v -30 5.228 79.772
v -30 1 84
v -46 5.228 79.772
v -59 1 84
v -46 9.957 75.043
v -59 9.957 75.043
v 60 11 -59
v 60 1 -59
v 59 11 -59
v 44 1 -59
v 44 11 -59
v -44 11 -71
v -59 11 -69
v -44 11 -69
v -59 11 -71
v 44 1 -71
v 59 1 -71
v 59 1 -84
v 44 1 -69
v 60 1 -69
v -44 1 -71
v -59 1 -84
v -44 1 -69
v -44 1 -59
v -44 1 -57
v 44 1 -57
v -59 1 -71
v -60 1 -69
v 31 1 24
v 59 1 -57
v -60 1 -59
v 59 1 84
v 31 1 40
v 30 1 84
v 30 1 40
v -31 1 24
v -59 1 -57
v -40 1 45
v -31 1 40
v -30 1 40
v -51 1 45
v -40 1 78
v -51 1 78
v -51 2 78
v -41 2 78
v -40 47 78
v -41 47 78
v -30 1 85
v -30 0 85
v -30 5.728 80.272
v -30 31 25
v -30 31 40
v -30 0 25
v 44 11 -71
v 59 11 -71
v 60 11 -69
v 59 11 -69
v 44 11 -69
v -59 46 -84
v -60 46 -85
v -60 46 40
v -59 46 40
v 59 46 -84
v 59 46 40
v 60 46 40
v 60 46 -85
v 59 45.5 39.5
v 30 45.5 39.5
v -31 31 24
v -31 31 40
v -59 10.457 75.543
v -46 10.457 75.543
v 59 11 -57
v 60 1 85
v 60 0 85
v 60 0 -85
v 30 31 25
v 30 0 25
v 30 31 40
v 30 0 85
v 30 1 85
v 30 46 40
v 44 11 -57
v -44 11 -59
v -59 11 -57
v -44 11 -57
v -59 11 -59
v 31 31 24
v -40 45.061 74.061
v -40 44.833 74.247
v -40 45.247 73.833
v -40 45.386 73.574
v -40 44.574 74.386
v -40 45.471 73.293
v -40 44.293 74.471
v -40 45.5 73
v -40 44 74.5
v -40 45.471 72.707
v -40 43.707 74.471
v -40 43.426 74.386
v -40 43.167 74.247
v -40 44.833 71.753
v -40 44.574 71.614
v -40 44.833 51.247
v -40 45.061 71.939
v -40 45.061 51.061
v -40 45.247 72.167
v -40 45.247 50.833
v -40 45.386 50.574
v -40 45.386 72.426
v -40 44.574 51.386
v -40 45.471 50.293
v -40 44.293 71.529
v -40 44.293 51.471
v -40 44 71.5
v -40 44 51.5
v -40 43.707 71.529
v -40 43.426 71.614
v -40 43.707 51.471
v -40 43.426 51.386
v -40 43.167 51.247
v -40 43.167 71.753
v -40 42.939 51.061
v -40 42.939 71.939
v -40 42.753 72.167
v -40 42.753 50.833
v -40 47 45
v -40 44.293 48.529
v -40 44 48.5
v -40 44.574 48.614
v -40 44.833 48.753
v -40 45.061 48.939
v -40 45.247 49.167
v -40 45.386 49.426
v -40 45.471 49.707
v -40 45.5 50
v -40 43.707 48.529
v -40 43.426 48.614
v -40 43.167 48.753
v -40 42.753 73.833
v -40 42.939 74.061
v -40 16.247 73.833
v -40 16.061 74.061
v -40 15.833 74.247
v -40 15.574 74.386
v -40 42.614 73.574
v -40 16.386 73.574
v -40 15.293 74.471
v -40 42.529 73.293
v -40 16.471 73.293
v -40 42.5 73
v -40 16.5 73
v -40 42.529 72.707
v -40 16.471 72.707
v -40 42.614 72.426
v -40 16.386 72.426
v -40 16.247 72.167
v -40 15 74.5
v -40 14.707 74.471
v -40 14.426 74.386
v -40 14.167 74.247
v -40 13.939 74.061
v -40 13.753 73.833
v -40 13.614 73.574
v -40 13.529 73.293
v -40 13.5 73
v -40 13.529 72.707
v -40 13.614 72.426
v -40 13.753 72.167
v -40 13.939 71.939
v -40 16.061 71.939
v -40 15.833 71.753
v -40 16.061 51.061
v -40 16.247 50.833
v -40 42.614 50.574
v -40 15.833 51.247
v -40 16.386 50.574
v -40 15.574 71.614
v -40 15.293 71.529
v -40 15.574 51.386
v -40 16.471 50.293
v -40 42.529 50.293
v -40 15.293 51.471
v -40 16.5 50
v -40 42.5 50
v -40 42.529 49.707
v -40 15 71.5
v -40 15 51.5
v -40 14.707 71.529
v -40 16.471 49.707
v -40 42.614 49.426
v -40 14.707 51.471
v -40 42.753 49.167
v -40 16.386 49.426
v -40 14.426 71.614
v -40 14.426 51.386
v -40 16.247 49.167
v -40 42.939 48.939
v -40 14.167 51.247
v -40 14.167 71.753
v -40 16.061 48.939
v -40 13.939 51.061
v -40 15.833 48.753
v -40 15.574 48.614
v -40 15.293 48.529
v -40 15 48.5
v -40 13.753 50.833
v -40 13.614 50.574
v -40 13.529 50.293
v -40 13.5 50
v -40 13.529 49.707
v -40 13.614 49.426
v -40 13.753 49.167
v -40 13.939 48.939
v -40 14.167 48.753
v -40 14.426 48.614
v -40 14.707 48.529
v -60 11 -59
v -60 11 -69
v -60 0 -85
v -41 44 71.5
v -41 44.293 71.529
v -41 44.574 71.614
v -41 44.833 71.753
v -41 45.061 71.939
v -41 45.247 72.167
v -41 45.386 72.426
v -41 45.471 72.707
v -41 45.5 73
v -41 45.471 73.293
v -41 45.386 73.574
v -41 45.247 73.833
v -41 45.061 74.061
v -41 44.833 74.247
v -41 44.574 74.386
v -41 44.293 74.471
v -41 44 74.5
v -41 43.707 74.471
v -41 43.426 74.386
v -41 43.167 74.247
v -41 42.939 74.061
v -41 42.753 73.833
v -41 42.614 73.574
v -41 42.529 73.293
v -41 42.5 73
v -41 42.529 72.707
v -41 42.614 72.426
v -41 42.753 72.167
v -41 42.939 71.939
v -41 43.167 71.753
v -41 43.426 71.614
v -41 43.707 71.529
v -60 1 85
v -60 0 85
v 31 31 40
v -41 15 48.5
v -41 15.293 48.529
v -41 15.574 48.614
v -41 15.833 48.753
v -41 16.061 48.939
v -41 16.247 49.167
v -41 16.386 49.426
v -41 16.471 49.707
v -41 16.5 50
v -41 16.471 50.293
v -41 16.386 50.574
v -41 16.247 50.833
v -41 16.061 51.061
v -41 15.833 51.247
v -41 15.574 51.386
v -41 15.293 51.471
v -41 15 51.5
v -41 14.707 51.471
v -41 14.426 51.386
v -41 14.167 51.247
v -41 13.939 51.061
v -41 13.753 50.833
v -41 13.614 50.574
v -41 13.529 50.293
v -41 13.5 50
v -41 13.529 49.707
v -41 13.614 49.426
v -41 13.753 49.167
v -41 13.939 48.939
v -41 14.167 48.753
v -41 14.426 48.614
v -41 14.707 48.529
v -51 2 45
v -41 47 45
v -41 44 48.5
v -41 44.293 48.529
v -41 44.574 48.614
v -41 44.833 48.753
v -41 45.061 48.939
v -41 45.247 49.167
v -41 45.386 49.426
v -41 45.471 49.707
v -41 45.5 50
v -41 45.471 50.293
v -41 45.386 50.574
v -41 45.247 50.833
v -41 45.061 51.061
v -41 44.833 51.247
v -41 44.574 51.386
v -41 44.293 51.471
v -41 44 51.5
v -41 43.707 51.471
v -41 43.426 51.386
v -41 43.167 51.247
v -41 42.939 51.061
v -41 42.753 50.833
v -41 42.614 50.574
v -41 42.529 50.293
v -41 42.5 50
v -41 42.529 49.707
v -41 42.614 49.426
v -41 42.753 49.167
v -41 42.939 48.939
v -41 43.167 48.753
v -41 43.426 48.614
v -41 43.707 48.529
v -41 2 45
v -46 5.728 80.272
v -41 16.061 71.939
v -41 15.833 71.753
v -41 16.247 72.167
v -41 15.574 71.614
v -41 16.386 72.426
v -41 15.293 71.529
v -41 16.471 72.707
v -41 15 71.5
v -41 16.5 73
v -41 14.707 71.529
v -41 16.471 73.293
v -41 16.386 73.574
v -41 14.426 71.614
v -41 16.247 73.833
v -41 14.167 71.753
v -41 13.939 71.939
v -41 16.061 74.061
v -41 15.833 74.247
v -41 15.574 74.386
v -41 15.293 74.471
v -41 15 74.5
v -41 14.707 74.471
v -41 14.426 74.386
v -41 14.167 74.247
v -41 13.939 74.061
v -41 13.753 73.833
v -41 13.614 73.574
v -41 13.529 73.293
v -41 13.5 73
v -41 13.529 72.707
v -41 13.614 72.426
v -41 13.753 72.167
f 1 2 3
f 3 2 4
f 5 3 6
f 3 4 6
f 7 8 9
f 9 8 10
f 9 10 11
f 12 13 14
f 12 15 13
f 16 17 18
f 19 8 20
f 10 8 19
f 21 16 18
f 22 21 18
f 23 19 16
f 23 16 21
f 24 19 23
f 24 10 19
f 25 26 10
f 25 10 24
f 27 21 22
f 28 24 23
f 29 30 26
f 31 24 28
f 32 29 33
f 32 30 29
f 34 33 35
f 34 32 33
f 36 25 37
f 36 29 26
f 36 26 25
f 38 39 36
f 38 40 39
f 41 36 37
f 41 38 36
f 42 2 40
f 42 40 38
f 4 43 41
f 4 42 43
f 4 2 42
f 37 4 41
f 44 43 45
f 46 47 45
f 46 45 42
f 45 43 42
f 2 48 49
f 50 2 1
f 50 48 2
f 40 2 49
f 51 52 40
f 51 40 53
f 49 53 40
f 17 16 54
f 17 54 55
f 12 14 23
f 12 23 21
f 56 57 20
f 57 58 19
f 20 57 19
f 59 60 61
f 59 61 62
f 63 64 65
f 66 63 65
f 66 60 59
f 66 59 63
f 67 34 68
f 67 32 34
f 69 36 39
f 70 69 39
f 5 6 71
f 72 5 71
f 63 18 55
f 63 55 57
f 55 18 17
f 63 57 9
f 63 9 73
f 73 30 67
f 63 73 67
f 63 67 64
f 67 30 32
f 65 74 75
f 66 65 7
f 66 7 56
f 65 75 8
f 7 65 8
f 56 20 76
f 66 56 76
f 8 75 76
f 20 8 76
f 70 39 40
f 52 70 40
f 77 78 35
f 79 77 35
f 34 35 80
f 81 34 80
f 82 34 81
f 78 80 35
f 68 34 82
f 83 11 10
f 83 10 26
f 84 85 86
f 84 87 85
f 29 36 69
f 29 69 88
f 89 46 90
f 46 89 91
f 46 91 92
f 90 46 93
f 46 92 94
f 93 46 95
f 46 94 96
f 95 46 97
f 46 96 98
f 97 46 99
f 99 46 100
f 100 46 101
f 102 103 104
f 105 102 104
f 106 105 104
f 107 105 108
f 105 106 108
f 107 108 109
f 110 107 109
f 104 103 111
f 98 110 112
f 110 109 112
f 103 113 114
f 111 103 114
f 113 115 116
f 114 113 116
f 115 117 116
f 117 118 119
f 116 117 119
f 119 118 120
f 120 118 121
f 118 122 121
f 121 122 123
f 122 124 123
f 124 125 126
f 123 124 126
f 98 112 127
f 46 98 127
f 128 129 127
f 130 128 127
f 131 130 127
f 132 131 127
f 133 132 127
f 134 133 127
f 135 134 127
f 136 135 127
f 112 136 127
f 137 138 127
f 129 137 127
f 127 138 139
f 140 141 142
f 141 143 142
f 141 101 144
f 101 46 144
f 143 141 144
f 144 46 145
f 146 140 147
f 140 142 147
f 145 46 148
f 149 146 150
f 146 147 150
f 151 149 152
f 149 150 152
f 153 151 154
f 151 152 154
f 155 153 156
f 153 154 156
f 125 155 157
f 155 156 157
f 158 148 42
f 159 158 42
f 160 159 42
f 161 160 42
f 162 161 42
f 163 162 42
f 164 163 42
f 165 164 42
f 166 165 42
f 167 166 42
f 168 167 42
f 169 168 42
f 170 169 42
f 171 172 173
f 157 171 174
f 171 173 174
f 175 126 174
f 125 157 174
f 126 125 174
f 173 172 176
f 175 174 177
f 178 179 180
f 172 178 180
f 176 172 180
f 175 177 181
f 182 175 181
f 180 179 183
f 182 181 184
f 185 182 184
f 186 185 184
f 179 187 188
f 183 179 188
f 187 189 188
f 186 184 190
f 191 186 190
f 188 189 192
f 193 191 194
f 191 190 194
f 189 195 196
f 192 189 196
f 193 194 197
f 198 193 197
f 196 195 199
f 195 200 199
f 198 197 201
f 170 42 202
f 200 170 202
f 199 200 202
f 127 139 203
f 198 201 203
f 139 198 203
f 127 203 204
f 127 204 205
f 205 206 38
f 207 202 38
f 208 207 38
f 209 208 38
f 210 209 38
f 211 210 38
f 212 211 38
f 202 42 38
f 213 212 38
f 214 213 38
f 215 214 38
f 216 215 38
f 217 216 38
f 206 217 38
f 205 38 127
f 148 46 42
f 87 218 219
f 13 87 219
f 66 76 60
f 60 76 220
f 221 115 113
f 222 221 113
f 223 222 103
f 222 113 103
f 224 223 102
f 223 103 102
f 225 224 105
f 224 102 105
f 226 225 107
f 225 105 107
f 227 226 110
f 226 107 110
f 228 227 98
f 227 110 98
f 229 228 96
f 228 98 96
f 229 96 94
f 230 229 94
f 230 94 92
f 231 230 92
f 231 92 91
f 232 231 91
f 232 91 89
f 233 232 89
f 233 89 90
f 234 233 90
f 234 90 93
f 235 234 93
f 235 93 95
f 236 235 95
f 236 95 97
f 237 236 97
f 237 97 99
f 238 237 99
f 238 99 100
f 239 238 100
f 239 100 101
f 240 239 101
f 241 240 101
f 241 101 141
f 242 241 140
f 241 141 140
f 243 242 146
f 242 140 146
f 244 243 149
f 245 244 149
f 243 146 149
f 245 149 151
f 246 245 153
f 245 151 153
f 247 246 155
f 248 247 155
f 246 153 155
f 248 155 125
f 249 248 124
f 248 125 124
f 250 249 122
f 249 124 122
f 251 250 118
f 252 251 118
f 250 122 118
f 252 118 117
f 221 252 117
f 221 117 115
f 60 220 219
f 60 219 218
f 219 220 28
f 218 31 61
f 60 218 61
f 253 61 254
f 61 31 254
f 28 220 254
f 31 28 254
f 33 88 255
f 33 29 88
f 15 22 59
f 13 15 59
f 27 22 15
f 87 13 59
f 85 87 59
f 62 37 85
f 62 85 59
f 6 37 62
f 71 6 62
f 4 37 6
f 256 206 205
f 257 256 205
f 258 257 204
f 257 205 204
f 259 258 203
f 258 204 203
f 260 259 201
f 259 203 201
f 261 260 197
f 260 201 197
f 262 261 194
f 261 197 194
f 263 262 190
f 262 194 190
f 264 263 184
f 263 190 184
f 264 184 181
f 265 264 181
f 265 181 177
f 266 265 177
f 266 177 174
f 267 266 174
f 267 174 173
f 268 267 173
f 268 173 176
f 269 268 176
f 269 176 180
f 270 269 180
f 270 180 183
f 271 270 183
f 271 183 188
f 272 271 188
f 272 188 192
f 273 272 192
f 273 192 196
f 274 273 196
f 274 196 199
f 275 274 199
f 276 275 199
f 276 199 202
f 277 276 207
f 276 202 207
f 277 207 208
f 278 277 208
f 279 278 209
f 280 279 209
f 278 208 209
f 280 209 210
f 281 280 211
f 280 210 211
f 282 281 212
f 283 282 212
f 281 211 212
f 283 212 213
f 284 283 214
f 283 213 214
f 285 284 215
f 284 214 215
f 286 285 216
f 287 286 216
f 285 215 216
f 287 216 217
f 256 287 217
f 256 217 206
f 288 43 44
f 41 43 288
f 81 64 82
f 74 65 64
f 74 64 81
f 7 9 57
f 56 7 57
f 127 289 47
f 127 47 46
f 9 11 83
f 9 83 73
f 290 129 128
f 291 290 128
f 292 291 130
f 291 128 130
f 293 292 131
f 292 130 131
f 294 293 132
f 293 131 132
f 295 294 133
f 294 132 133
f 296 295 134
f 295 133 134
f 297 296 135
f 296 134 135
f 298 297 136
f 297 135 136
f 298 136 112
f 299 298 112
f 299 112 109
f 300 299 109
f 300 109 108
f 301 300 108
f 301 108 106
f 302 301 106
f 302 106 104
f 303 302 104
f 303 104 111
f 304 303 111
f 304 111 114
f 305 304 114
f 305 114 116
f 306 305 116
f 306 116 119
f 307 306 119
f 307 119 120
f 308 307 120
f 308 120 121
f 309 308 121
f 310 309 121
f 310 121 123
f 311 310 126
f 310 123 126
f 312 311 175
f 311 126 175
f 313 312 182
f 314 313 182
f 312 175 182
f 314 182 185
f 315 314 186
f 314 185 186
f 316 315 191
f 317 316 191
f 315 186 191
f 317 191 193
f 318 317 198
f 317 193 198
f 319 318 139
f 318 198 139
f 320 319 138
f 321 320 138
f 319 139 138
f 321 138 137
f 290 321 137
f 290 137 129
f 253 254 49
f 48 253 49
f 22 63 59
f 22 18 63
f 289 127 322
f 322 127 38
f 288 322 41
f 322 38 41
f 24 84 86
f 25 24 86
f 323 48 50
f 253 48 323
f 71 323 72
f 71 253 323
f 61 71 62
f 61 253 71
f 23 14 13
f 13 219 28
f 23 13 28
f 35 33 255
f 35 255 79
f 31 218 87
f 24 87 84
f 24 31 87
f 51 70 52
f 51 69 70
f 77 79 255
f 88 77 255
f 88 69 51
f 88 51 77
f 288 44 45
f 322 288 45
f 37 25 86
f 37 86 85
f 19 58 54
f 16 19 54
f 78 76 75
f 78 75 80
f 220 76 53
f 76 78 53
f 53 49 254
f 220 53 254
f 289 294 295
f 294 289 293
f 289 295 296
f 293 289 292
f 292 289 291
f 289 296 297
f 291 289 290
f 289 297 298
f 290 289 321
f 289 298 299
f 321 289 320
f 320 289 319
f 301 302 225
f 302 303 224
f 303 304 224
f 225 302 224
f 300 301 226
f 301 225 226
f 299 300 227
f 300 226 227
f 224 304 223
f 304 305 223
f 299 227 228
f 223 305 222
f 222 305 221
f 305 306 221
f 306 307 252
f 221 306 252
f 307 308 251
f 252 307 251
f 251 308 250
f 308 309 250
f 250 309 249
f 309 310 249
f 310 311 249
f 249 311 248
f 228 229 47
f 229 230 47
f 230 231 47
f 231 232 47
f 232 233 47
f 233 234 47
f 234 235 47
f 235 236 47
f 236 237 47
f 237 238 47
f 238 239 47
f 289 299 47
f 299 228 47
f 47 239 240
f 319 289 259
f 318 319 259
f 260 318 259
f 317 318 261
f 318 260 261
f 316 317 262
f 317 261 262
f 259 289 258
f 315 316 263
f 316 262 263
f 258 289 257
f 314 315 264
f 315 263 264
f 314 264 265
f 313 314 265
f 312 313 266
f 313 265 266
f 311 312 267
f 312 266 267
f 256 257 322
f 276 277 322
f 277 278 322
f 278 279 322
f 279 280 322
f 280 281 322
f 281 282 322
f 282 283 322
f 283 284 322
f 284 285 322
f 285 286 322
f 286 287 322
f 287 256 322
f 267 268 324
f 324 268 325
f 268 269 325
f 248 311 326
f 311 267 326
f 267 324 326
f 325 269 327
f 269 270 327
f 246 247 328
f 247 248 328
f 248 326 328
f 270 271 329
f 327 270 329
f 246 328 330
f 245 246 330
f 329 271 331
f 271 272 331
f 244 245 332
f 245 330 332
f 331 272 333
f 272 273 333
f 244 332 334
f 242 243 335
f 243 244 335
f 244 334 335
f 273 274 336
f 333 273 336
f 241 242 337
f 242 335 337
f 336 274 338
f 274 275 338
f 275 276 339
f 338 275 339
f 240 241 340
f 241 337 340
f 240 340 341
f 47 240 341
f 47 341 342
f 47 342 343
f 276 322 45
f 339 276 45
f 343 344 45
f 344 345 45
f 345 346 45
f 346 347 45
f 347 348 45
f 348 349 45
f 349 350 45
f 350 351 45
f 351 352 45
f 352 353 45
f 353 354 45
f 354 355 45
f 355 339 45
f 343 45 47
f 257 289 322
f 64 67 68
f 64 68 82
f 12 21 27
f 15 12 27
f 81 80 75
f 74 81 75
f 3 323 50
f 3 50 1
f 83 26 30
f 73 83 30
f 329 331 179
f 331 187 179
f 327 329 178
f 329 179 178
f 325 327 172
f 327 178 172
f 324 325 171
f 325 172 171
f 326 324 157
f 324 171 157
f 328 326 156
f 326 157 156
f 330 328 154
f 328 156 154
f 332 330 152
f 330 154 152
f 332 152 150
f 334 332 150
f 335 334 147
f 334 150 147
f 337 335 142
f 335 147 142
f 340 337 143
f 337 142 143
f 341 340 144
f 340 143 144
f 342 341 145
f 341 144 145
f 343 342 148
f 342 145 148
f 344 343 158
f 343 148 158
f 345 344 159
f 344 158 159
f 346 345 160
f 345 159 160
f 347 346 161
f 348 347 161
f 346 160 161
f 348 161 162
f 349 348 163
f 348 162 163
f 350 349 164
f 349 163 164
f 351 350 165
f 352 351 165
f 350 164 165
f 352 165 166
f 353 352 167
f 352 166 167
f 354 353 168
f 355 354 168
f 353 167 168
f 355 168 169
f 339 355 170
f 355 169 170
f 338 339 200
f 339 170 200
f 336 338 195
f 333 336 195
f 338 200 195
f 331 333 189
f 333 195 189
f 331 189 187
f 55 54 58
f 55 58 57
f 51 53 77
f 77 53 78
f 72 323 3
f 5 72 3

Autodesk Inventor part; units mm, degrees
ref_plane "YZ Plane" through (0, 0, 0) normal (1, 0, 0) x (0, 1, 0)
ref_plane "XZ Plane" through (0, 0, 0) normal (0, 1, 0) x (-1, 0, 0)
ref_plane "XY Plane" through (0, 0, 0) normal (0, 0, 1) x (1, 0, 0)
sketch "Boceto1" plane through (0, 0, 0) normal (0, 1, 0) x (-1, 0, 0)
  line L0 (-60, 85) -> (-60, -85)
  line L1 (-60, -85) -> (60, -85)
  line L2 (60, -85) -> (60, 85)
  line L3 (-30, 85) -> (-30, 25)
  line L4 (-30, 25) -> (30, 25)
  line L5 (30, 25) -> (30, 85)
  line L6 (60, 85) -> (30, 85)
  line L7 (-30, 85) -> (-60, 85)
  point P0 (0, 0)
  dimension "d0" = 120
  dimension "d1" = 170
  dimension "d2" = 60
  dimension "d4" = 60
  dimension "d5" = 60
  dimension "d6" = 30
  dimension "d11" = 60
  dimension "d12" = 85
extrude "Extrusión1" add sketch "Boceto1" along normal blind 1
sketch "Boceto2" plane through (0, 1, 0) normal (0, 1, 0) x (1, 0, 0)
  line L0 (-60, 85) -> (-55, 85)
  line L1 (-59, 84) -> (-59, -85)
  line L2 (-59, -85) -> (-60, -85)
  line L3 (-60, -85) -> (-60, 85)
  line L4 (60, -85) -> (60, 85) projected
  line L5 (-60, 85) -> (60, 85)
  line L6 (60, 85) -> (60, 84)
  line L7 (59, 84) -> (-59, 84)
  line L8 (-60, 20) -> (-60, 85)
  line L9 (60, 85) -> (55, 85)
  line L10 (59, 84) -> (59, -85)
  line L11 (59, -85) -> (60, -85)
  line L12 (60, -85) -> (60, 85)
  line L13 (-30, -25) -> (30, -25)
  point P0 (0, 0)
  point P1 (60, -85)
  point P2 (60, 85)
  dimension "d15" = 1
  dimension "d17" = 1
  dimension "d18" = 1
  dimension "d22" = 170
  dimension "d23" = 1
  dimension "d24" = 170
  dimension "d57" = 0
  dimension "d58" = 0
  dimension "d59" = 5
  dimension "d60" = 115
  dimension "d61" = 115
  dimension "d62" = 0
  dimension "d63" = 0
  dimension "d64" = 0
extrude "Extrusión2" add sketch "Boceto2" along normal blind 45
sketch "Sketch37" plane through (0, 1, 0) normal (0, 1, 0) x (1, 0, 0)
  line L0 (-30, -25) -> (30, -25)
  line L1 (30, -24) -> (-30, -24)
  line L2 (-31, -25) -> (-31, -40)
  line L3 (-31, -40) -> (-30, -40)
  line L4 (-30, -40) -> (-30, -25)
  line L5 (30, -25) -> (30, -85) projected
  line L6 (31, -25) -> (31, -40)
  line L7 (31, -40) -> (30, -40)
  line L8 (30, -40) -> (30, -25)
  line L9 (-31, -25) -> (-31, -24)
  line L10 (-31, -24) -> (-30, -24)
  line L11 (30, -24) -> (31, -24)
  line L12 (31, -24) -> (31, -25)
  point P0 (0, 0)
  dimension "d127" = 1
  dimension "d129" = 1
  dimension "d130" = 90
  dimension "d131" = 16
  dimension "d132" = 15
  dimension "d133" = 0
  dimension "d134" = 60
  dimension "d135" = 15
  dimension "d136" = 15
extrude "Extrusion26" add sketch "Sketch37" along normal blind 30
sketch "Sketch39" plane through (0, 1, 0) normal (0, 1, 0) x (1, 0, 0)
  line L0 (-51, -45) -> (-40, -45)
  line L1 (-40, -45) -> (-40, -78)
  line L2 (-40, -78) -> (-51, -78)
  line L3 (-51, -78) -> (-51, -45)
  line L4 (-30, -85) -> (-30, -40) projected
  line L5 (-59, -85) -> (-30, -85) projected
  point P0 (0, 0)
  dimension "d139" = 11
  dimension "d140" = 33
  dimension "d141" = 10
  dimension "d142" = 7
extrude "Extrusion27" add sketch "Sketch39" along normal blind 1
sketch "Sketch42" plane through (-59, 1, 85) normal (1, 0, 0) x (0, 0, -1)
  line L0 (0, 45) -> (169, 45) projected
  line L1 (0, 0) -> (45, 0) construction
  line L2 (45, 0) -> (45, 45) construction
  line L3 (45, 45) -> (0, 45) construction
  line L4 (0, 45) -> (0, 0) construction
  line L5 (0, 0) -> (169, 0) projected
  line L6 (169, 0) -> (169, 45) projected
  line L7 (0, 45) -> (169, 45) projected
  line L8 (0, 0) -> (0, 45) projected
  line L9 (0, -1) -> (0, 0) projected
  line L10 (170, -1) -> (0, -1) projected
  line L11 (170, 45) -> (170, -1) projected
  line L12 (169, 45) -> (170, 45) projected
  line L13 (0, 0) -> (45, 45)
  line L14 (0, 45) -> (0, 0)
  line L15 (0, -1) -> (0, 45) projected
  point P0 (85, -1)
  dimension "d159" = 45
extrude "Extrusion30" cut sketch "Sketch42" against normal blind 33.25 contours L0 L13 L8
sketch "Sketch43" plane through (-59, 1, -84) normal (1, 0, 0) x (0, 0, -1)
  line L0 (0, 0) -> (-169, 0) projected
  line L1 (-159.5434, 0) -> (-159.5434, 11.2545) construction
  line L2 (-169, 0) -> (-124, 45) projected
  line L3 (-159.5434, 9.4566) -> (-169, 0)
  line L4 (-169, 0) -> (-168, 0)
  line L5 (-168, 0) -> (-159.0434, 8.9566)
  line L6 (-159.0434, 8.9566) -> (-159.5434, 9.4566)
  point P0 (-84, -1)
  dimension "d162" = 1
extrude "Extrusion31" add sketch "Sketch43" along normal blind 29
sketch "Sketch45" plane through (-30, 0, 85) normal (1, 0, 0) x (0, 0, -1)
  line L0 (9.4566, 10.4566) -> (0, 1) projected
  line L1 (4.7283, 5.7283) -> (9.4566, 10.4566)
  line L2 (9.4566, 10.4566) -> (9.9566, 9.9566) projected
  line L3 (9.4566, 10.4566) -> (9.9566, 9.9566)
  line L4 (9.9566, 9.9566) -> (5.2283, 5.2283)
  line L5 (1, 1) -> (9.9566, 9.9566) projected
  line L6 (4.7283, 5.7283) -> (5.2283, 5.2283)
  point P0 (85, 0)
extrude "Extrusion33" cut sketch "Sketch45" against normal blind 16
sketch "Sketch46" plane through (0, 2, 0) normal (0, 1, 0) x (1, 0, 0)
  line L0 (-40, -78) -> (-40, -45) projected
  line L1 (-40, -45) -> (-41, -45)
  line L2 (-41, -45) -> (-41, -78)
  line L3 (-41, -78) -> (-40, -78)
  line L4 (-40, -78) -> (-40, -45)
  point P0 (0, 0)
  dimension "d169" = 1
extrude "Extrusion34" add sketch "Sketch46" along normal blind 45
sketch "Sketch47" plane through (-40, 1, 78) normal (1, 0, 0) x (0, 0, -1)
  line L0 (5, 43) -> (28, 43) construction
  line L1 (0, 0) -> (0, 46) projected
  line L2 (5, 14) -> (28, 14) construction
  line L3 (0, 46) -> (33, 46) projected
  circle A0 centre (5, 43) radius 1.5
  circle A1 centre (28, 43) radius 1.5
  circle A2 centre (5, 14) radius 1.5
  circle A3 centre (28, 14) radius 1.5
  point P0 (78, -1)
  dimension "d172" = 23
  dimension "d173" = 5
  dimension "d174" = 29
  dimension "d175" = 3
  dimension "d176" = 3
  dimension "d177" = 3
  dimension "d178" = 3
  dimension "d179" = 3
extrude "Extrusion35" cut sketch "Sketch47" against normal blind 1
sketch "Sketch50" plane through (60, 0, 85) normal (1, 0, 0) x (0, 0, -1)
  line L0 (0, 1) -> (45, 46) projected
  line L1 (0, 1) -> (45, 46)
  line L2 (169, 46) -> (0, 46) projected
  line L3 (45, 46) -> (0, 46)
  line L4 (0, 46) -> (0, 1)
  line L5 (0, 0) -> (0, 46) projected
  point P0 (85, 0)
extrude "Extrusion36" cut sketch "Sketch50" against normal blind 1
sketch "Sketch51" plane through (59, 1, -84) normal (-1, 0, 0) x (0, 0, 1)
  line L0 (124, 45) -> (169, 0) projected
  line L1 (124, 45) -> (169, 0)
  line L2 (169, 0) -> (168, 0)
  line L3 (169, 0) -> (0, 0) projected
  line L4 (168, 0) -> (123.5, 44.5)
  line L5 (0, 45) -> (124, 45) projected
  line L6 (123.5, 44.5) -> (124, 45)
  point P0 (84, -1)
  dimension "d185" = 1
extrude "Extrusion37" add sketch "Sketch51" along normal blind 29
sketch "Sketch52" plane through (-60, 0, -85) normal (-1, 0, 0) x (0, 0, 1)
  line L0 (169, 1) -> (1, 1) projected
  line L1 (16, 1) -> (26, 1)
  line L2 (26, 1) -> (26, 11)
  line L3 (26, 11) -> (16, 11)
  line L4 (16, 11) -> (16, 1)
  line L5 (1, 1) -> (1, 46) projected
  point P0 (85, 0)
  point P1 (26, 1)
  dimension "d188" = 10
  dimension "d189" = 10
  dimension "d190" = 15
extrude "Extrusion38" cut sketch "Sketch52" against normal blind 120
sketch "Sketch53" plane through (0, 1, 0) normal (0, 1, 0) x (1, 0, 0)
  line L0 (-59, 69) -> (-44, 69)
  line L1 (-44, 69) -> (-44, 71)
  line L2 (-44, 71) -> (-59, 71)
  line L3 (-59, 71) -> (-59, 69)
  line L4 (-59, 59) -> (-59, -84) projected
  line L5 (-59, 59) -> (-44, 59)
  line L6 (-44, 59) -> (-44, 57)
  line L7 (-44, 57) -> (-59, 57)
  line L8 (-59, 57) -> (-59, 59)
  line L9 (59, 69) -> (59, 84) projected
  line L10 (59, 69) -> (44, 69)
  line L11 (44, 69) -> (44, 71)
  line L12 (44, 71) -> (59, 71)
  line L13 (59, 71) -> (59, 69)
  line L14 (59, 69) -> (59, 59) projected
  line L15 (59, 59) -> (44, 59)
  line L16 (44, 59) -> (44, 57)
  line L17 (44, 57) -> (59, 57)
  line L18 (59, 57) -> (59, 59)
  point P0 (0, 0)
  dimension "d193" = 15
  dimension "d194" = 2
  dimension "d195" = 15
  dimension "d196" = 2
  dimension "d197" = 15
extrude "Extrusion39" add sketch "Sketch53" along normal blind 10
properties part number "Chasisneww"
